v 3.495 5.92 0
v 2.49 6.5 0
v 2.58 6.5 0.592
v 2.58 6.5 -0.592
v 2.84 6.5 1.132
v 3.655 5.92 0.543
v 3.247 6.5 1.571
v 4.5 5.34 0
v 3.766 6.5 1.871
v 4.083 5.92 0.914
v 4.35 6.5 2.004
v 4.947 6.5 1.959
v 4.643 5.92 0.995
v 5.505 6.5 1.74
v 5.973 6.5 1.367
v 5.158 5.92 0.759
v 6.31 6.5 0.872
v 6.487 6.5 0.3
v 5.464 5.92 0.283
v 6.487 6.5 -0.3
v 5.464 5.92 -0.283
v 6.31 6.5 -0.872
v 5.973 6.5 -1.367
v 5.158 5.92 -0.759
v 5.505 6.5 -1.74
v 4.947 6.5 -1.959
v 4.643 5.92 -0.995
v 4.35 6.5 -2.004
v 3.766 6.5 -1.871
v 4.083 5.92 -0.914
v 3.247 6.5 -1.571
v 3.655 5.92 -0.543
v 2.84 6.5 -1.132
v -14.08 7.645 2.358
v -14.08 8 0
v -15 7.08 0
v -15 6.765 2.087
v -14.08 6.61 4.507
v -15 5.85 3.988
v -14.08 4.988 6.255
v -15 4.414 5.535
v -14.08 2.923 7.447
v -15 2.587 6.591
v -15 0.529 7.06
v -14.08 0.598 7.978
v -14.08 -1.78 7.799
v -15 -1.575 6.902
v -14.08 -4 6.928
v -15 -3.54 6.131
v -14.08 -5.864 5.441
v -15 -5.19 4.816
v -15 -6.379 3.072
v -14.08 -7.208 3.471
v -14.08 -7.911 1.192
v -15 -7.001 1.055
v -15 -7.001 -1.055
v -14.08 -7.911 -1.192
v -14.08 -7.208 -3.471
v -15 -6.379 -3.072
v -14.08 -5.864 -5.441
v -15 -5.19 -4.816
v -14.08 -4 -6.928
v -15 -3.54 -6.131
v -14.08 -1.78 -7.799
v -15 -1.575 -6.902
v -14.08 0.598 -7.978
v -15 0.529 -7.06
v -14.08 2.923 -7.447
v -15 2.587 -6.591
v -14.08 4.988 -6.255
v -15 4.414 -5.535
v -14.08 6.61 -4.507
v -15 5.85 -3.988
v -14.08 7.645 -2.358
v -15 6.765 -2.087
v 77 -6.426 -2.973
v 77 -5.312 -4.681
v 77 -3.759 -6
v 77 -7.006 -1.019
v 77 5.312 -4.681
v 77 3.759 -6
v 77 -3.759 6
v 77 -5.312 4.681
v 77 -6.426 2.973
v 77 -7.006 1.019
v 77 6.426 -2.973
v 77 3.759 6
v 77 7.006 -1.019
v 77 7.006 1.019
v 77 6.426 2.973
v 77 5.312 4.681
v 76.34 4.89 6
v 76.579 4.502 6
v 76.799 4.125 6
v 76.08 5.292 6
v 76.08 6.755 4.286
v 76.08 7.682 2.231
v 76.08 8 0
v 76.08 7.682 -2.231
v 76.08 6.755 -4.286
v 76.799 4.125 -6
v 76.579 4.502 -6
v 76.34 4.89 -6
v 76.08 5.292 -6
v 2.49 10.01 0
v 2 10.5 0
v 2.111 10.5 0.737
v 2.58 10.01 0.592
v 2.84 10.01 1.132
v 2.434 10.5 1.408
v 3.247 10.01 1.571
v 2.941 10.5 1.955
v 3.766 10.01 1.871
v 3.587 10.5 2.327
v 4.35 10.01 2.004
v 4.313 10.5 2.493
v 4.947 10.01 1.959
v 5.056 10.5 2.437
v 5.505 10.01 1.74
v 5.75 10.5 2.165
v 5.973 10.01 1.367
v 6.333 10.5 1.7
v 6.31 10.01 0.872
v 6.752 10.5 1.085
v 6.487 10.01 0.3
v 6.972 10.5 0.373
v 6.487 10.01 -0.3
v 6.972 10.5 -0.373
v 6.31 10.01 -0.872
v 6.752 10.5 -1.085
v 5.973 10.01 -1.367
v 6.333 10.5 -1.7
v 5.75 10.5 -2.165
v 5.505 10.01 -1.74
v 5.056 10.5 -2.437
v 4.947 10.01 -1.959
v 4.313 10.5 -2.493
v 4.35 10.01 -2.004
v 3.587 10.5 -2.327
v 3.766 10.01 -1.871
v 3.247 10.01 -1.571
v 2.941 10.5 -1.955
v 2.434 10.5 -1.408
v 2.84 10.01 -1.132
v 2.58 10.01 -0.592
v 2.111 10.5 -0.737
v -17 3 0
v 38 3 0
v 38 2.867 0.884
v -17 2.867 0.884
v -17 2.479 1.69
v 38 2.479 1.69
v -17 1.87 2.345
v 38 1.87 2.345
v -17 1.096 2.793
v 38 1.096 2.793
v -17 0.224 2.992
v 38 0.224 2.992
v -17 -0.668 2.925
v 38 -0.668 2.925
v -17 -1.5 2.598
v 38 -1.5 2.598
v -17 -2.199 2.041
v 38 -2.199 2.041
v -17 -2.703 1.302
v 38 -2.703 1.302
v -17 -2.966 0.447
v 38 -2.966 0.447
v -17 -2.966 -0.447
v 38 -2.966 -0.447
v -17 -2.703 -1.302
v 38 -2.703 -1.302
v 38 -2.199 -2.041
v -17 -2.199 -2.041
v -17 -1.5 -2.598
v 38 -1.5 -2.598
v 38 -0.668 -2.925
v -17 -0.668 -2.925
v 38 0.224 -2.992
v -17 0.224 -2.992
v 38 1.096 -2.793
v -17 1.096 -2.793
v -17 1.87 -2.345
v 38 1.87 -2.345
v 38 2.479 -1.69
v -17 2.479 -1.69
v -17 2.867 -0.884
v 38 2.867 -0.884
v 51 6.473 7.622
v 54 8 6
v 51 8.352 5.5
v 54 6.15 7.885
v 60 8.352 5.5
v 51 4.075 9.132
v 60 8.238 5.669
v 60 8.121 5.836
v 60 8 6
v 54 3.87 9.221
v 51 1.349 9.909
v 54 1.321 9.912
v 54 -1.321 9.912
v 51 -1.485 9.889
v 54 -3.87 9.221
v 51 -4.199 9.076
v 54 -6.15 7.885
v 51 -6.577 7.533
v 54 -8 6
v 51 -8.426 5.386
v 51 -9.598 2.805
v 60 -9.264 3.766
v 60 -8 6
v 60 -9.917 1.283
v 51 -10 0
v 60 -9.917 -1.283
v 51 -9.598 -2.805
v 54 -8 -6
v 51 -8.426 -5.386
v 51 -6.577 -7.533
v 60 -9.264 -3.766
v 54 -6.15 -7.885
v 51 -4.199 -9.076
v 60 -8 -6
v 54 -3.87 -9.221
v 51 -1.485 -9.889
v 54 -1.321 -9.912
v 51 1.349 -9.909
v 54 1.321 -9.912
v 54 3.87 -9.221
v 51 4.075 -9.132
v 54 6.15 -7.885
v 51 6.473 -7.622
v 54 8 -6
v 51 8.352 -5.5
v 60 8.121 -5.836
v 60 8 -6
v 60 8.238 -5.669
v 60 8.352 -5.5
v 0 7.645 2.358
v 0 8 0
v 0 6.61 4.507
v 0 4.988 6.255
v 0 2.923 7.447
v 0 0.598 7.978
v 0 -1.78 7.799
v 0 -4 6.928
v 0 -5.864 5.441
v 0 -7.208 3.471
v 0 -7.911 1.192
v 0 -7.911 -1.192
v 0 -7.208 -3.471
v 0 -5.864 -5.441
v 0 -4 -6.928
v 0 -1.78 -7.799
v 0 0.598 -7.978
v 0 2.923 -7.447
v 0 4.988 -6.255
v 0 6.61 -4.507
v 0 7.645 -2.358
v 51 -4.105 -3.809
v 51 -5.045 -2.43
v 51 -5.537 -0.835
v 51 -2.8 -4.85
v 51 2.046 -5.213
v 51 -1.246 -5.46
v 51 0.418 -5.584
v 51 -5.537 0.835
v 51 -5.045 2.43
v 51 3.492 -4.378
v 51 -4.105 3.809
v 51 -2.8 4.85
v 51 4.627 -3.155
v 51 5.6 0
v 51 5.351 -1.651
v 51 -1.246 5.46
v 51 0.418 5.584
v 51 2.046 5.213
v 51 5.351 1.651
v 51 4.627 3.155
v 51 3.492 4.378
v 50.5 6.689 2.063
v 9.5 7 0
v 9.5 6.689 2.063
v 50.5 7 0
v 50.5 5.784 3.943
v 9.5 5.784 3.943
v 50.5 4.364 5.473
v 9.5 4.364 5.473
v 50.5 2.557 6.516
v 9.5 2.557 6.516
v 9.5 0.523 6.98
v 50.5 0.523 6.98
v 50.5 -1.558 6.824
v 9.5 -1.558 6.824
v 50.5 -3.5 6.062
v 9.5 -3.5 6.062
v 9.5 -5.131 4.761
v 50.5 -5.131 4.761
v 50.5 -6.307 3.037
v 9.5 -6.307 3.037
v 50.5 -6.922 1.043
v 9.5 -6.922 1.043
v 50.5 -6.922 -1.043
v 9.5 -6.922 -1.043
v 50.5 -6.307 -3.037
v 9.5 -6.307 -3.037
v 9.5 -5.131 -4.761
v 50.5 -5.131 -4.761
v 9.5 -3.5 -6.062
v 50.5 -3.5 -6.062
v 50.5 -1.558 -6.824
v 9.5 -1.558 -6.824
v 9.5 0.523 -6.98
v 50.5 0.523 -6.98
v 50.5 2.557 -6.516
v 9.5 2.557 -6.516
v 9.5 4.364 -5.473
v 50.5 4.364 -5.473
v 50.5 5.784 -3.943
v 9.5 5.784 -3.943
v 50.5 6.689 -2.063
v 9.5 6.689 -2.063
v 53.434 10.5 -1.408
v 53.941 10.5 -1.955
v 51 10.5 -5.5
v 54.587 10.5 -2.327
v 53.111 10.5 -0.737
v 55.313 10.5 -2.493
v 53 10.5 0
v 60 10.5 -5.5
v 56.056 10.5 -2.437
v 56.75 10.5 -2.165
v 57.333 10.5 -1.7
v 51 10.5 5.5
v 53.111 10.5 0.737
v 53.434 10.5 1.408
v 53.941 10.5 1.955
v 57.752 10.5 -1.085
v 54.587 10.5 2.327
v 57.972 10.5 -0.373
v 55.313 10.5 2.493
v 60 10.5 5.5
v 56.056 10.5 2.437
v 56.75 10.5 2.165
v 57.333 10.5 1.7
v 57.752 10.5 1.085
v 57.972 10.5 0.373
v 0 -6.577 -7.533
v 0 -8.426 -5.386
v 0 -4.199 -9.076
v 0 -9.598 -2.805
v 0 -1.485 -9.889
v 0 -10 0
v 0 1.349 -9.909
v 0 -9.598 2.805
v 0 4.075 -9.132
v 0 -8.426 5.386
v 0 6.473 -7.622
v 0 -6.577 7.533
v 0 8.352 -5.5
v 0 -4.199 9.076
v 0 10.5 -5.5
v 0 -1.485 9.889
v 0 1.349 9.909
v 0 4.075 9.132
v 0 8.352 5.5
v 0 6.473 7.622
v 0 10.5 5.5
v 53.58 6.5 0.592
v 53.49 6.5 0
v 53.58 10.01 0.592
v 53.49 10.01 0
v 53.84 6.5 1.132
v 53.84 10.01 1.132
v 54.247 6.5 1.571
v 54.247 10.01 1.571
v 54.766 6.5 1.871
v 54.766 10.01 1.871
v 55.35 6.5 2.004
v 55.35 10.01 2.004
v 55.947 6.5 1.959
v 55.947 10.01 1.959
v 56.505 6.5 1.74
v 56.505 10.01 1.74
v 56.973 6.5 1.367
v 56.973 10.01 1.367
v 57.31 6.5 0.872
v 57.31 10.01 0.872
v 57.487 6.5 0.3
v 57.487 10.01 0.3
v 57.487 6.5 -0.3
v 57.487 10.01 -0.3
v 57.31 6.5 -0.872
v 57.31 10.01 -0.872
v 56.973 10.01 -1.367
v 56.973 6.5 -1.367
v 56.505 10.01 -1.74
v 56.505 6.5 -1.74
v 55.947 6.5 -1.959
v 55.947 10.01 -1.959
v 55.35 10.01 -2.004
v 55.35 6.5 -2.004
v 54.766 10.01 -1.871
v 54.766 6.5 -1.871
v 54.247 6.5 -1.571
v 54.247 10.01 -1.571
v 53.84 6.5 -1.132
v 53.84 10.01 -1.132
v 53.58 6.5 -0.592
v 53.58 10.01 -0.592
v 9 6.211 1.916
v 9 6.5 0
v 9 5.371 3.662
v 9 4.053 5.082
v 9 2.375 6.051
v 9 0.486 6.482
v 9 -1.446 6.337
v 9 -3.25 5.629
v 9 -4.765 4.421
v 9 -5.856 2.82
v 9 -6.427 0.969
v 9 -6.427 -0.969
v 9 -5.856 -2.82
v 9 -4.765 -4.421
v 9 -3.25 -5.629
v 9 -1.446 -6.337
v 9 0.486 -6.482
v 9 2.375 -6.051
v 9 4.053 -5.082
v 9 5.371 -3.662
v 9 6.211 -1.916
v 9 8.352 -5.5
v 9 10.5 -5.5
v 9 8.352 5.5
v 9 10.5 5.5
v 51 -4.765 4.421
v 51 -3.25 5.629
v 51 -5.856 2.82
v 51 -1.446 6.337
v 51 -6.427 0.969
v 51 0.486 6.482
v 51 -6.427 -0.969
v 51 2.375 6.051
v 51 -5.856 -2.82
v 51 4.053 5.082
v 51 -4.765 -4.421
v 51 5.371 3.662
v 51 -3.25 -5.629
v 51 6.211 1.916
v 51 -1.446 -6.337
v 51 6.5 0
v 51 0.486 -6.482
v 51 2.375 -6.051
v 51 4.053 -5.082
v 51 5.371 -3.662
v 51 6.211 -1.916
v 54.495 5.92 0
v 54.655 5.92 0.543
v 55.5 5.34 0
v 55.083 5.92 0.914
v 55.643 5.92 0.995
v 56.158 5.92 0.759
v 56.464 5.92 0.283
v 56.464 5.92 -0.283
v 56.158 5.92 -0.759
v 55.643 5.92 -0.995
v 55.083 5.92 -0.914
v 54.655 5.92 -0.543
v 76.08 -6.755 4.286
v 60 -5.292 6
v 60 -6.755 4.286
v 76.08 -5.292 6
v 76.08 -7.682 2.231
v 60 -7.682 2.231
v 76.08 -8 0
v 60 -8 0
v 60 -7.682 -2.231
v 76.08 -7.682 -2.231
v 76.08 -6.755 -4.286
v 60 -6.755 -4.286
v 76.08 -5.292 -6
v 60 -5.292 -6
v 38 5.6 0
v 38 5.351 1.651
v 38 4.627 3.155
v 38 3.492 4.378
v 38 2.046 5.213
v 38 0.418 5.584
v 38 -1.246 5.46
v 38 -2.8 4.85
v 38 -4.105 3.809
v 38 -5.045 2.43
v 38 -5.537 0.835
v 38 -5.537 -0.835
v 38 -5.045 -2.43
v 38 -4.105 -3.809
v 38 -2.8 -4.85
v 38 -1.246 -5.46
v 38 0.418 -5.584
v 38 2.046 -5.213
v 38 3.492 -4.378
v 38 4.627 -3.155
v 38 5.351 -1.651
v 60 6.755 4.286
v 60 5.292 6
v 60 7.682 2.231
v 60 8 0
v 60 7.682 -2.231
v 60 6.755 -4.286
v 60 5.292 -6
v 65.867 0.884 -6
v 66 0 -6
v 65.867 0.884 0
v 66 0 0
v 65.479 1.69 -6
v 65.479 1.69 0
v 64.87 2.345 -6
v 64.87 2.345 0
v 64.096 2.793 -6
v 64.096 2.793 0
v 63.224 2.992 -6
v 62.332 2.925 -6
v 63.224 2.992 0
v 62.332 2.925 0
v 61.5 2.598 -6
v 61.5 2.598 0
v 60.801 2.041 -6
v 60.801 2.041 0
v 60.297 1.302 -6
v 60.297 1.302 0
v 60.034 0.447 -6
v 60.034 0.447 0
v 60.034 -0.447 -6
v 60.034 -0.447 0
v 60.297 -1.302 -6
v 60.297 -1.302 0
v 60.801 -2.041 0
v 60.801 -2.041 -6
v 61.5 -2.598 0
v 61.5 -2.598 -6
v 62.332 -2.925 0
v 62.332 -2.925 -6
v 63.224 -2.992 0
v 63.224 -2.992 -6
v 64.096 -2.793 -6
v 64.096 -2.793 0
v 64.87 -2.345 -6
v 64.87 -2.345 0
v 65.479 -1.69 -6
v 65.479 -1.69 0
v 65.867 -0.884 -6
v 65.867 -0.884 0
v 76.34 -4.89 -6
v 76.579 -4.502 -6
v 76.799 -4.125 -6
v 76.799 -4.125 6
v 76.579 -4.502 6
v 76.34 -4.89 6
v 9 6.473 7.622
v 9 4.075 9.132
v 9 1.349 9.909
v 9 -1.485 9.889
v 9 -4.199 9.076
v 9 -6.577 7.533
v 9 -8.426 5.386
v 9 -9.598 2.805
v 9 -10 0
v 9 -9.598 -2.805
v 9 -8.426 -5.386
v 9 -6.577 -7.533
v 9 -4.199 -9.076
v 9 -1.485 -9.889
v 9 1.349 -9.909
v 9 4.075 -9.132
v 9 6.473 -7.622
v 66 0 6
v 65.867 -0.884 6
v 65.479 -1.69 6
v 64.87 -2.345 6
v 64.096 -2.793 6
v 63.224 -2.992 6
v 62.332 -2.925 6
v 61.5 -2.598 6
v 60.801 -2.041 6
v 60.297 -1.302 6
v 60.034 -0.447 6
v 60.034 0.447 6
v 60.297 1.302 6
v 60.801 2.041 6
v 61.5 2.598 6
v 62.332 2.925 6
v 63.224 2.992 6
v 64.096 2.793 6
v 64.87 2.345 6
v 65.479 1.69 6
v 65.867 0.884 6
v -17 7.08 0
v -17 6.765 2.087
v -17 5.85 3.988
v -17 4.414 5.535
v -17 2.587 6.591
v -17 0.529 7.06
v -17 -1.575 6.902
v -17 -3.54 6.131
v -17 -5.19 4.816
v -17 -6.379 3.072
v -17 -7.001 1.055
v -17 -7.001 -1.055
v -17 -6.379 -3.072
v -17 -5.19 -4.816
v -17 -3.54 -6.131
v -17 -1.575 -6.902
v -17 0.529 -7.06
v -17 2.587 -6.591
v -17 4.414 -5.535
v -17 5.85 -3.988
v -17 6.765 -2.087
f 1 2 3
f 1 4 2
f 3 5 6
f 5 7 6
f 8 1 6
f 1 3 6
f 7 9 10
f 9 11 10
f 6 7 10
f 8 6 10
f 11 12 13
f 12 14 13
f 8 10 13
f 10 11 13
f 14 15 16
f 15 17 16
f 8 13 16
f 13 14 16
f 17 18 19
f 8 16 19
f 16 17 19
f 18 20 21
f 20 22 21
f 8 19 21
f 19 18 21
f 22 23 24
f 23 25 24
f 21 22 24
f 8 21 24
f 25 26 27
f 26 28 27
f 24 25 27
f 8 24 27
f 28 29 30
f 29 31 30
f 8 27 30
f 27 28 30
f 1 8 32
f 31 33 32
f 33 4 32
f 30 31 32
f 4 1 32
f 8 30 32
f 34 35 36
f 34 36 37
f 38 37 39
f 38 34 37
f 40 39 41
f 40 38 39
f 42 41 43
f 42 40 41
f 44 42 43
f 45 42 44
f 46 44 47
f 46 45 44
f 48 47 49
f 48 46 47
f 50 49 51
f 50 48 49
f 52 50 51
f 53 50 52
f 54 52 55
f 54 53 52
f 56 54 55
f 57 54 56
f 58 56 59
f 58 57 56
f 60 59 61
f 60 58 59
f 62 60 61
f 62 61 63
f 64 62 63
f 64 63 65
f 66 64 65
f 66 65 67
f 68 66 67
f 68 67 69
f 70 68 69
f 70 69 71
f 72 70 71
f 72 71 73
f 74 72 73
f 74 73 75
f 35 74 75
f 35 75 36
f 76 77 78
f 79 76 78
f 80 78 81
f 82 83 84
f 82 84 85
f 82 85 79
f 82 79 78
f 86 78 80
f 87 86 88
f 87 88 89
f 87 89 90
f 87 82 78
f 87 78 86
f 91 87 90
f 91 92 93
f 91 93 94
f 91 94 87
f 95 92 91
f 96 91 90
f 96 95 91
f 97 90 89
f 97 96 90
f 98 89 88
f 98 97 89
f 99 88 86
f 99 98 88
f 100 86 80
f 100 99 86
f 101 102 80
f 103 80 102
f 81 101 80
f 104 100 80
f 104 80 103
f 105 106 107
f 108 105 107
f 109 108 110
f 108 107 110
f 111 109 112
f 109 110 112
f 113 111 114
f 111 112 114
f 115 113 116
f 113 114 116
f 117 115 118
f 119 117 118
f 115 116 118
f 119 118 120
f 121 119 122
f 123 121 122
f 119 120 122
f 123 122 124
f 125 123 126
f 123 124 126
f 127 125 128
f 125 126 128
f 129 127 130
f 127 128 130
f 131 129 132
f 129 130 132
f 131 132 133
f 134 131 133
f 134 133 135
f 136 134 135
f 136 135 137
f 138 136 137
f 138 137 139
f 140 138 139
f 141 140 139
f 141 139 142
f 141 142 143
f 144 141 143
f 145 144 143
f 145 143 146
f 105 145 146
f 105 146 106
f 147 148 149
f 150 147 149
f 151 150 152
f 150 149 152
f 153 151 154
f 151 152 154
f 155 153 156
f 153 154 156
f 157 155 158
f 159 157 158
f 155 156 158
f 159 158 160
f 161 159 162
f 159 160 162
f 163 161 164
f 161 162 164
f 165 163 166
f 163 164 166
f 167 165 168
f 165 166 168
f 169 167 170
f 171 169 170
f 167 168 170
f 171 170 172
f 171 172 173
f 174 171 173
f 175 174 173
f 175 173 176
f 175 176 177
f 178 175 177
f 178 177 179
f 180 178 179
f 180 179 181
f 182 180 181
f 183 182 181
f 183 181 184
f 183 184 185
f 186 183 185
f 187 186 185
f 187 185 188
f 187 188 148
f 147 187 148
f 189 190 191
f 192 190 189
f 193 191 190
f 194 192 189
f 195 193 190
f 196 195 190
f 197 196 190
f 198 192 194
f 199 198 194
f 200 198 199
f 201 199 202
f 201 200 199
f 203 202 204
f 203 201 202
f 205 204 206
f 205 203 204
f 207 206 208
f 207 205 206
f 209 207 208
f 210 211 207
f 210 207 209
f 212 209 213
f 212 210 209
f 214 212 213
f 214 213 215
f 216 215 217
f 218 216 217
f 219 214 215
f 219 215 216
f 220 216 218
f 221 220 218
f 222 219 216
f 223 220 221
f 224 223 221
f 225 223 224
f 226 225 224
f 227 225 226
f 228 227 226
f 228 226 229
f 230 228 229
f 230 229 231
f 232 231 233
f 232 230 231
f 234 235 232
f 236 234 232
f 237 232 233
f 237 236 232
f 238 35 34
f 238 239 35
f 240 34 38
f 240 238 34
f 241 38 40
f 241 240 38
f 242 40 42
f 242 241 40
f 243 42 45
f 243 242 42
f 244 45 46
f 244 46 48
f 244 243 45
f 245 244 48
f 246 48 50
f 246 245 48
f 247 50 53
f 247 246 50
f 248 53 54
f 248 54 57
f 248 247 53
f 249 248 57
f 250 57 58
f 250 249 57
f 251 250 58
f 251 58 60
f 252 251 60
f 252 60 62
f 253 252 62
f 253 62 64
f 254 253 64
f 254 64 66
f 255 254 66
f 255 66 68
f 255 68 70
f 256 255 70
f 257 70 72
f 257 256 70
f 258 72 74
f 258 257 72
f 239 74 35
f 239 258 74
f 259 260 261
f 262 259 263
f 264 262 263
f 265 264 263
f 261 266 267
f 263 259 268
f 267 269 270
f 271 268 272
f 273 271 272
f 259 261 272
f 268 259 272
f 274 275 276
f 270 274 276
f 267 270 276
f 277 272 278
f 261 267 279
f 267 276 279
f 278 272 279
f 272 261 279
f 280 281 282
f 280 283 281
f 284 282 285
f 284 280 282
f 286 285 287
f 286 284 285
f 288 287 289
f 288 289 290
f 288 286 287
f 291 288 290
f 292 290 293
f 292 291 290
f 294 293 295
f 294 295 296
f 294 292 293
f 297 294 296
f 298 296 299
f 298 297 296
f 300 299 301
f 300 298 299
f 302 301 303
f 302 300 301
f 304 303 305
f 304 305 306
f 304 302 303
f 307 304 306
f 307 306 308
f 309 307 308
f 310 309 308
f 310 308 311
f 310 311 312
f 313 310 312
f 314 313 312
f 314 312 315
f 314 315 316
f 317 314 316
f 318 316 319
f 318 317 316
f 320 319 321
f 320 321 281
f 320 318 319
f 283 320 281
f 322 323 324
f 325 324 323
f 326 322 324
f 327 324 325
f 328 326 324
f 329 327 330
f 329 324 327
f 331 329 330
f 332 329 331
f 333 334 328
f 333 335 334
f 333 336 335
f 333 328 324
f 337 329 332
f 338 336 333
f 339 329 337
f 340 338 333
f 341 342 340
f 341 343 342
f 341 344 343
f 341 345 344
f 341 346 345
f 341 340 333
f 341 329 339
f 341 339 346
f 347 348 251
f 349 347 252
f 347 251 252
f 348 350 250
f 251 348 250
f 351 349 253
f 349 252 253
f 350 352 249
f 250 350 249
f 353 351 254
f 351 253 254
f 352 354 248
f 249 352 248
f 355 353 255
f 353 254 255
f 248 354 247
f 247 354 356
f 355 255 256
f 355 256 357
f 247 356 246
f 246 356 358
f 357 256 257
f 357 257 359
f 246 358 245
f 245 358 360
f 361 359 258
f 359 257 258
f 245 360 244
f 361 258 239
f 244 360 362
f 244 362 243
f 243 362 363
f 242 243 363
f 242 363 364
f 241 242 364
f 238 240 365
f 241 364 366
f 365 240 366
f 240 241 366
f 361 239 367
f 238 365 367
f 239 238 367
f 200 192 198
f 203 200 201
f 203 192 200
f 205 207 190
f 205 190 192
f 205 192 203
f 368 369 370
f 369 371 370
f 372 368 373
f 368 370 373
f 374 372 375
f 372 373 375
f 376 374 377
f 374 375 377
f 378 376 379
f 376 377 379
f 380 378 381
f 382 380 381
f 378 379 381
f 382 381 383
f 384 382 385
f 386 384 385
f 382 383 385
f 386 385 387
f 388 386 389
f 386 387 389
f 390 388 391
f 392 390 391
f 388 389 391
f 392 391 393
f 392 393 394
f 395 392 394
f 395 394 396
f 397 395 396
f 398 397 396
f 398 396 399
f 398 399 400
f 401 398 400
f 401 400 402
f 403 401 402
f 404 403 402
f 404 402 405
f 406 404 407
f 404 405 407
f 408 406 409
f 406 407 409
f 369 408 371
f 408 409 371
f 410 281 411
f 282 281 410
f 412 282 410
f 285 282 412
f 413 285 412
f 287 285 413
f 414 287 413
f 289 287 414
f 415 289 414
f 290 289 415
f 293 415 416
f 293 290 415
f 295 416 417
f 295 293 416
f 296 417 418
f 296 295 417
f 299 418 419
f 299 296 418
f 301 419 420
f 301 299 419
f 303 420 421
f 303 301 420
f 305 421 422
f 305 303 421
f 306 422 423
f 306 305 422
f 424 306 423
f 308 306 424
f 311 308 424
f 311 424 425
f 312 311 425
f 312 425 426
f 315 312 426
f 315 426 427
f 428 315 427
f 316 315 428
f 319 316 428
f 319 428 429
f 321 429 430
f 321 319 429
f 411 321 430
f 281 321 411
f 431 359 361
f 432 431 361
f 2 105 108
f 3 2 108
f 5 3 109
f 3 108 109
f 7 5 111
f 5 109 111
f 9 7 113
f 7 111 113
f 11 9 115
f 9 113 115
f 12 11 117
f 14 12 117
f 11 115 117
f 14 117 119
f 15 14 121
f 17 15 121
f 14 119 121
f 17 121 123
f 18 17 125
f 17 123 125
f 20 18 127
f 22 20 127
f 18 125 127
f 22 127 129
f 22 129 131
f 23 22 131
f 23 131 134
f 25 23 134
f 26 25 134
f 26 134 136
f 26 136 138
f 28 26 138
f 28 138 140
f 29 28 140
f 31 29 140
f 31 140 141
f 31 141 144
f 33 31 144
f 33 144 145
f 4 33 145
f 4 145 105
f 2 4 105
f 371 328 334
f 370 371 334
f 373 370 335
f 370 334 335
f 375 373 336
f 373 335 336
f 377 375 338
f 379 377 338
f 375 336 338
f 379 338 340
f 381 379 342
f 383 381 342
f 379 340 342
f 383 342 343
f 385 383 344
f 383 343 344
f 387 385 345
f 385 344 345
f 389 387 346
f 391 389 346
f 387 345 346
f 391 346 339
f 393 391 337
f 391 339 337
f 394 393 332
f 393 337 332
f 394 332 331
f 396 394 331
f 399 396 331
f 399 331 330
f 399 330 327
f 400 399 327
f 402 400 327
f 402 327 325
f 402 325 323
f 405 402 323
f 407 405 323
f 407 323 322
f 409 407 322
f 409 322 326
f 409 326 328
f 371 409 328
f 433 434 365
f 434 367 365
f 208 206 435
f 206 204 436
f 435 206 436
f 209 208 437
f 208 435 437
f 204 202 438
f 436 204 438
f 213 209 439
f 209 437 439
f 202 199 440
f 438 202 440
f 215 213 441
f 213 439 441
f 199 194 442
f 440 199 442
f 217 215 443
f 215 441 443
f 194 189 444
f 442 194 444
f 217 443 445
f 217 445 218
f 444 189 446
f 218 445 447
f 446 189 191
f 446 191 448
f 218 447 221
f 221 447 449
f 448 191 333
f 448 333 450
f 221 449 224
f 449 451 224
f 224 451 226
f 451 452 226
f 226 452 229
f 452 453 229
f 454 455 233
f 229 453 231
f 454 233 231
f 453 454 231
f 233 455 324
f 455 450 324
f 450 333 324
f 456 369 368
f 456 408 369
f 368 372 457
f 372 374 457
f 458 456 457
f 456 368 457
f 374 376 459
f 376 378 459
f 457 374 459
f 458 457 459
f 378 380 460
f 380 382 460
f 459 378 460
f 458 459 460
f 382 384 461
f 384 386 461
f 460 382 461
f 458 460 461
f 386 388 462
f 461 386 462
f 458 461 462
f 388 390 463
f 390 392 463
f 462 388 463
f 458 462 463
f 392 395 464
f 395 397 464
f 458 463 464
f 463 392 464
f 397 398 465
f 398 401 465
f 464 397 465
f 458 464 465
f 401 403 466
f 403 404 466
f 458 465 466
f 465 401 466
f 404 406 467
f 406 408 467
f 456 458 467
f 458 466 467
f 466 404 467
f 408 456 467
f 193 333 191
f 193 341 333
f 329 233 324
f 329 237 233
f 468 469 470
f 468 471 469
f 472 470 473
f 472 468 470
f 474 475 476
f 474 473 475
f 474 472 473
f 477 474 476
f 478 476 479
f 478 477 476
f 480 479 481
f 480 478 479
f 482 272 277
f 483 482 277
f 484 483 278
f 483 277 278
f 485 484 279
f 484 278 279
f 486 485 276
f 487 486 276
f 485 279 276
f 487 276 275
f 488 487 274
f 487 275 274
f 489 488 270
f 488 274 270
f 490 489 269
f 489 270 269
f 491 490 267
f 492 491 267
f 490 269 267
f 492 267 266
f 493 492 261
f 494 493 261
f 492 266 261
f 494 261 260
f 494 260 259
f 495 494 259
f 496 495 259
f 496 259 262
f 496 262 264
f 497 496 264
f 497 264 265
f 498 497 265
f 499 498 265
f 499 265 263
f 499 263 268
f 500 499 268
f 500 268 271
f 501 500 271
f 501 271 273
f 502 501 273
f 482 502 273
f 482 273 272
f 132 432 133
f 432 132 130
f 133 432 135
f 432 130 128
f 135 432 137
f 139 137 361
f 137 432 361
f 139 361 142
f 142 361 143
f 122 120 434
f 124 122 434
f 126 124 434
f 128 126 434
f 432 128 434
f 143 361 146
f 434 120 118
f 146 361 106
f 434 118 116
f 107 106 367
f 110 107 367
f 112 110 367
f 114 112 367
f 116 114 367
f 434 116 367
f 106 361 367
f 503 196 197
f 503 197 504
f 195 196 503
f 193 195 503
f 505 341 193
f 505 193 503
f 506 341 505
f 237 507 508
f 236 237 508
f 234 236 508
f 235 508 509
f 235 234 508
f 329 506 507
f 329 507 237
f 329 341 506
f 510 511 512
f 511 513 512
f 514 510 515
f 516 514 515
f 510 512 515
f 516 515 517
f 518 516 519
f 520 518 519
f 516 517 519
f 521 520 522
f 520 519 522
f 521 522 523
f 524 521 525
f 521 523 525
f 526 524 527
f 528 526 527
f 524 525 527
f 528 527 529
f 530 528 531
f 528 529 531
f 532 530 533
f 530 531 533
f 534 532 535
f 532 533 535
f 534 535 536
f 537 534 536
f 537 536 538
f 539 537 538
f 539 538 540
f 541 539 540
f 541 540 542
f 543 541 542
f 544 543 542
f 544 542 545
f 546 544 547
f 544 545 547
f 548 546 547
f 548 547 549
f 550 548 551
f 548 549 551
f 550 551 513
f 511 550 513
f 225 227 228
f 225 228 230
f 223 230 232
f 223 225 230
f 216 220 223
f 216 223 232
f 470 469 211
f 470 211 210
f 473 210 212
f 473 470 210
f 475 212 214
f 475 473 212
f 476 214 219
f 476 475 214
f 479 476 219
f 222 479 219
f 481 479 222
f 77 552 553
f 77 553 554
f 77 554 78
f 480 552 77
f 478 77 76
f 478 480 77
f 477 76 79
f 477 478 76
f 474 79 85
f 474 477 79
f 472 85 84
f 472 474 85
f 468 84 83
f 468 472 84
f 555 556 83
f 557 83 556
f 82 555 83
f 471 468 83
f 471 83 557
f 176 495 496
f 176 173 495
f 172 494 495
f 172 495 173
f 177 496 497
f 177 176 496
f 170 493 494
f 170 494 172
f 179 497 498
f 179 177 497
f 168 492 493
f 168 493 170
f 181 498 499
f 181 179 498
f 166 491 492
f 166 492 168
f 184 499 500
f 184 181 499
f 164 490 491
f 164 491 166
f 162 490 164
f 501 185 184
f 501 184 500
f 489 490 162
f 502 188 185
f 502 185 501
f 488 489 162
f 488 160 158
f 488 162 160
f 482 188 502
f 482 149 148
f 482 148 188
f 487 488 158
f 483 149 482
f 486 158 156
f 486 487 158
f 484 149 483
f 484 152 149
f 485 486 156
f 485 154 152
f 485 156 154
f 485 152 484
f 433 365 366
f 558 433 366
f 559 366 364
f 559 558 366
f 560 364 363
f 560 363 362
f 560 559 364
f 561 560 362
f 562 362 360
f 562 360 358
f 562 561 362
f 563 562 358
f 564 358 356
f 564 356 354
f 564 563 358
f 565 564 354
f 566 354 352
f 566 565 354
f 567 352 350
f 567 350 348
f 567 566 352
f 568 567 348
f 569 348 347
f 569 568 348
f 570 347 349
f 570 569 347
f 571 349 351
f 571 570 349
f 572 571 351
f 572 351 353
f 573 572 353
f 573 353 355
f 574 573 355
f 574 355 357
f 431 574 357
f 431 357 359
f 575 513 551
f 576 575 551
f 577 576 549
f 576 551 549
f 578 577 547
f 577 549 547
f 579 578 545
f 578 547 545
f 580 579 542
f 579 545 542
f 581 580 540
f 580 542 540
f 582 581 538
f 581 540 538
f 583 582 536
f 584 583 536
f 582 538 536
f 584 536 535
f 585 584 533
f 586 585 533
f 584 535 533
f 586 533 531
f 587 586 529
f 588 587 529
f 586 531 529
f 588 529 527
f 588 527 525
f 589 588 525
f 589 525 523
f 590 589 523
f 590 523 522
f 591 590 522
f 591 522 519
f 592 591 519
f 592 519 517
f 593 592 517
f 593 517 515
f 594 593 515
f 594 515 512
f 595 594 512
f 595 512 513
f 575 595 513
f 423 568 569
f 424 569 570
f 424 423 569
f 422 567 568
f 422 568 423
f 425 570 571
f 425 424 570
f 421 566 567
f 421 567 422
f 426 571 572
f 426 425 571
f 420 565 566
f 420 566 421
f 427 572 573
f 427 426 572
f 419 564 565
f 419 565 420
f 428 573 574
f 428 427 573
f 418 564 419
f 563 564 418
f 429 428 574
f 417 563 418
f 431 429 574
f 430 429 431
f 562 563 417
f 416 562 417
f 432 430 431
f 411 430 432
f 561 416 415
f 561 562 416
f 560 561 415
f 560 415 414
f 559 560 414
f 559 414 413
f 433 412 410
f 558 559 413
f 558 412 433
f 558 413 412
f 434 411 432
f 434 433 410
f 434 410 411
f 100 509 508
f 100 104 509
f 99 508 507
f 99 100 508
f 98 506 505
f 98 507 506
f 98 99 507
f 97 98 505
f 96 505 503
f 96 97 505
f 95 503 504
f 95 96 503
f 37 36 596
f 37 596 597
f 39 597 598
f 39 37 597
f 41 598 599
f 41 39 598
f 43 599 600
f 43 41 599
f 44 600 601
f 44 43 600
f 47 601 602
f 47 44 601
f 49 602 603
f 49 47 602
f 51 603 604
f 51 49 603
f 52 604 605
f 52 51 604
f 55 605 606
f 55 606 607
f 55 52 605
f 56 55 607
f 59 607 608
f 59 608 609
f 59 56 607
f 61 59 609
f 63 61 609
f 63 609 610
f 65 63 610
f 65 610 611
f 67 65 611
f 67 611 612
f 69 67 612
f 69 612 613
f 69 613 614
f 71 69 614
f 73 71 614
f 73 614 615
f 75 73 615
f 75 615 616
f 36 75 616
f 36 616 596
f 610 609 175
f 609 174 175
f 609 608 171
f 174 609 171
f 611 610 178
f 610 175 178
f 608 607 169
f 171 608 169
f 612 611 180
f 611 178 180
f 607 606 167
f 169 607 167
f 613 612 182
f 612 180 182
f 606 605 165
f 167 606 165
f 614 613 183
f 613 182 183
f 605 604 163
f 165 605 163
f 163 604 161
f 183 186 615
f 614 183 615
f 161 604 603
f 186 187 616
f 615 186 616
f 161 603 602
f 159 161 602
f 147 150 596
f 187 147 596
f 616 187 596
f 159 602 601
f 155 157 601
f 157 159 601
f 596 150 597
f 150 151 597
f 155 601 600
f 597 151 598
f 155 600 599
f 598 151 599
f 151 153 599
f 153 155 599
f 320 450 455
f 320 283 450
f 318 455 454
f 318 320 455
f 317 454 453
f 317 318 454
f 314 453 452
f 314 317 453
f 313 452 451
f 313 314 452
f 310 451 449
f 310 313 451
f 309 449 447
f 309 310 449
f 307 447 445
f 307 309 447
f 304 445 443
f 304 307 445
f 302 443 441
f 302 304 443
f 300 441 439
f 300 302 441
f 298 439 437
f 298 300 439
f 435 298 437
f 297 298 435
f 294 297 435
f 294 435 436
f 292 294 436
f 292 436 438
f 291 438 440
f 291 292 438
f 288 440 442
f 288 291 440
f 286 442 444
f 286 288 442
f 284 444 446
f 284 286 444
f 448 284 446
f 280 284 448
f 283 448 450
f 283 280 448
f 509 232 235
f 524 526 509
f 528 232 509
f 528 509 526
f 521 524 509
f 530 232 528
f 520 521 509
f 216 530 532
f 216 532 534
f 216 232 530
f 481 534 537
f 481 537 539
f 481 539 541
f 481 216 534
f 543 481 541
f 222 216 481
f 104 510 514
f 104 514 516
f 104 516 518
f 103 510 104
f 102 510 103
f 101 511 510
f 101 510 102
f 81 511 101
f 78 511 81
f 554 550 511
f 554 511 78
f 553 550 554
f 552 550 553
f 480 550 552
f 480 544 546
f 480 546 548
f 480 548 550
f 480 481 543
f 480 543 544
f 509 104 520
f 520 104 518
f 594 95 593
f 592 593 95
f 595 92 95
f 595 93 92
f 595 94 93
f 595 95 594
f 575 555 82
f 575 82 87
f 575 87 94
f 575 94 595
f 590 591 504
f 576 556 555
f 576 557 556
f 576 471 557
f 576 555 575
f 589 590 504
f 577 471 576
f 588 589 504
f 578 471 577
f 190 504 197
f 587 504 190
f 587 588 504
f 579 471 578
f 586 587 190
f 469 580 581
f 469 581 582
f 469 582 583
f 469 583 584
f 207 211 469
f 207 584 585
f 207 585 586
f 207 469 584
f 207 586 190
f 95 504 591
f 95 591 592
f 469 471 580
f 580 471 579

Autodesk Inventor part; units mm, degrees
sketch "Skizze_1" plane through (0, 0, 0) normal (0, 0, 1) x (1, 0, 0)
  line L0 (77, 0) -> (-17, 0)
  line L1 (-17, 0) -> (-17, 7.08)
  line L2 (-17, 7.08) -> (-15, 7.08)
  line L3 (-15, 7.08) -> (-14.08, 8)
  line L4 (-14.08, 8) -> (0, 8)
  line L5 (0, 8) -> (0, 10)
  line L6 (0, 10) -> (9, 10)
  line L7 (9, 10) -> (9, 6.5)
  line L8 (9, 6.5) -> (9.5, 7)
  line L9 (9.5, 7) -> (50.5, 7)
  line L10 (50.5, 7) -> (51, 6.5)
  line L11 (51, 6.5) -> (51, 10)
  line L12 (51, 10) -> (60, 10)
  line L13 (60, 10) -> (60, 8)
  line L14 (60, 8) -> (76.08, 8)
  line L15 (76.08, 8) -> (77, 7.08)
  line L16 (77, 7.08) -> (77, 0)
  line L17 (77, 0) -> (-17, 0)
revolve "Revolution1" add sketch "Skizze_1" angle 360 about axis through (77, 0, 0) along (1, 0, 0)
thread "Thread1" size "M16x1.5" class "6g" standard "ISO Metric profile" length 12.08
thread "Thread2" size "M16x1.5" class "6g" standard "ISO Metric profile" length 14.4865
sketch "Skizze_3" plane through (0, 0, 0) normal (1, 0, 0) x (0, 1, 0)
  line L0 (10.5, 5.5) -> (0, 5.5)
  line L1 (0, 5.5) -> (0, -5.5)
  line L2 (0, -5.5) -> (10.5, -5.5)
  line L3 (10.5, -5.5) -> (10.5, 5.5)
extrude "Extrusion1" add sketch "Skizze_3" along normal blind 9
sketch "Skizze_4" plane through (60, 0, 0) normal (1, 0, 0) x (0, 0, -1)
  line L0 (-5.5, 10.5) -> (-5.5, 0)
  line L1 (-5.5, 0) -> (5.5, 0)
  line L2 (5.5, 0) -> (5.5, 10.5)
  line L3 (5.5, 10.5) -> (-5.5, 10.5)
extrude "Extrusion2" add sketch "Skizze_4" against normal blind 9
sketch "Skizze_16_ALT_Drilling_1" plane through (0, 0, 0) normal (0, 0, 1) x (1, 0, 0)
  line L0 (51, 0) -> (-17, 0)
  line L1 (-17, 0) -> (-17, 3)
  line L2 (-17, 3) -> (38, 3)
  line L3 (38, 3) -> (38, 5.6)
  line L4 (38, 5.6) -> (51, 5.6)
  line L5 (51, 5.6) -> (51, 0)
  line L6 (51, 0) -> (-17, 0)
revolve "Revolution2" cut sketch "Skizze_16_ALT_Drilling_1" angle 360 about axis through (51, 0, 0) along (1, 0, 0)
sketch "Skizze_7" plane through (0, 0, 0) normal (0, 1, 0) x (-1, 0, 0)
  line L0 (-54, -12) -> (-54, -6)
  line L1 (-54, -6) -> (-77, -6)
  line L2 (-77, -6) -> (-77, 6)
  line L3 (-77, 6) -> (-54, 6)
  line L4 (-54, 6) -> (-54, 12)
  line L5 (-54, 12) -> (-86, 12)
  line L6 (-86, 12) -> (-86, -12)
  line L7 (-86, -12) -> (-54, -12)
extrude "Extrusion3" cut sketch "Skizze_7" along normal mid plane 24
sketch "Skizze_8" plane through (0, 0, 0) normal (0, 0, 1) x (1, 0, 0)
  circle A0 centre (63, 0) radius 3
extrude "Extrusion4" cut sketch "Skizze_8" along normal mid plane 24
sketch "Skizze_9_ALT_Drilling_2" plane through (0, 0, 0) normal (0, 0, 1) x (1, 0, 0)
  line L0 (4.5, 10.5) -> (4.5, 5.3398)
  line L1 (4.5, 5.3398) -> (2.4905, 6.5)
  line L2 (2.4905, 6.5) -> (2.4905, 10.0095)
  line L3 (2.4905, 10.0095) -> (2, 10.5)
  line L4 (2, 10.5) -> (4.5, 10.5)
  line L5 (4.5, 10.5) -> (4.5, 5.3398)
revolve "Revolution3" cut sketch "Skizze_9_ALT_Drilling_2" angle 360 about axis through (4.5, 10.5, 0) along (0, 1, 0)
sketch "Skizze_10_ALT_Drilling_3" plane through (0, 0, 0) normal (0, 0, 1) x (1, 0, 0)
  line L0 (55.5, 10.5) -> (55.5, 5.3398)
  line L1 (55.5, 5.3398) -> (53.4905, 6.5)
  line L2 (53.4905, 6.5) -> (53.4905, 10.0095)
  line L3 (53.4905, 10.0095) -> (53, 10.5)
  line L4 (53, 10.5) -> (55.5, 10.5)
  line L5 (55.5, 10.5) -> (55.5, 5.3398)
revolve "Revolution4" cut sketch "Skizze_10_ALT_Drilling_3" angle 360 about axis through (55.5, 10.5, 0) along (0, 1, 0)
ref_plane "C1_XY" through (0, 0, 0) normal (1, 0, 0) x (0, 0, -1)
ref_plane "C1_YZ" through (0, 0, 0) normal (0, 0, -1) x (0, 1, 0)
ref_plane "C1_ZX" through (0, 0, 0) normal (0, 1, 0) x (1, 0, 0)
ref_plane "CD1_XY" through (0, 0, 0) normal (1, 0, 0) x (0, 0, -1)
ref_plane "CD1_YZ" through (0, 0, 0) normal (0, 0, -1) x (0, 1, 0)
ref_plane "CD1_ZX" through (0, 0, 0) normal (0, 1, 0) x (1, 0, 0)
ref_plane "CD2_XY" through (60, 0, 0) normal (1, 0, 0) x (0, 0, -1)
ref_plane "CD2_YZ" through (60, 0, 0) normal (0, 0, -1) x (0, 1, 0)
ref_plane "CD2_ZX" through (60, 0, 0) normal (0, 1, 0) x (1, 0, 0)
ref_plane "RL_XY" through (-17, 0, 0) normal (1, 0, 0) x (0, 0, -1)
ref_plane "RL_YZ" through (-17, 0, 0) normal (0, 0, -1) x (0, 1, 0)
ref_plane "RL_ZX" through (-17, 0, 0) normal (0, 1, 0) x (1, 0, 0)
properties part number "16N2A12A010-(N0-cilindro)"
